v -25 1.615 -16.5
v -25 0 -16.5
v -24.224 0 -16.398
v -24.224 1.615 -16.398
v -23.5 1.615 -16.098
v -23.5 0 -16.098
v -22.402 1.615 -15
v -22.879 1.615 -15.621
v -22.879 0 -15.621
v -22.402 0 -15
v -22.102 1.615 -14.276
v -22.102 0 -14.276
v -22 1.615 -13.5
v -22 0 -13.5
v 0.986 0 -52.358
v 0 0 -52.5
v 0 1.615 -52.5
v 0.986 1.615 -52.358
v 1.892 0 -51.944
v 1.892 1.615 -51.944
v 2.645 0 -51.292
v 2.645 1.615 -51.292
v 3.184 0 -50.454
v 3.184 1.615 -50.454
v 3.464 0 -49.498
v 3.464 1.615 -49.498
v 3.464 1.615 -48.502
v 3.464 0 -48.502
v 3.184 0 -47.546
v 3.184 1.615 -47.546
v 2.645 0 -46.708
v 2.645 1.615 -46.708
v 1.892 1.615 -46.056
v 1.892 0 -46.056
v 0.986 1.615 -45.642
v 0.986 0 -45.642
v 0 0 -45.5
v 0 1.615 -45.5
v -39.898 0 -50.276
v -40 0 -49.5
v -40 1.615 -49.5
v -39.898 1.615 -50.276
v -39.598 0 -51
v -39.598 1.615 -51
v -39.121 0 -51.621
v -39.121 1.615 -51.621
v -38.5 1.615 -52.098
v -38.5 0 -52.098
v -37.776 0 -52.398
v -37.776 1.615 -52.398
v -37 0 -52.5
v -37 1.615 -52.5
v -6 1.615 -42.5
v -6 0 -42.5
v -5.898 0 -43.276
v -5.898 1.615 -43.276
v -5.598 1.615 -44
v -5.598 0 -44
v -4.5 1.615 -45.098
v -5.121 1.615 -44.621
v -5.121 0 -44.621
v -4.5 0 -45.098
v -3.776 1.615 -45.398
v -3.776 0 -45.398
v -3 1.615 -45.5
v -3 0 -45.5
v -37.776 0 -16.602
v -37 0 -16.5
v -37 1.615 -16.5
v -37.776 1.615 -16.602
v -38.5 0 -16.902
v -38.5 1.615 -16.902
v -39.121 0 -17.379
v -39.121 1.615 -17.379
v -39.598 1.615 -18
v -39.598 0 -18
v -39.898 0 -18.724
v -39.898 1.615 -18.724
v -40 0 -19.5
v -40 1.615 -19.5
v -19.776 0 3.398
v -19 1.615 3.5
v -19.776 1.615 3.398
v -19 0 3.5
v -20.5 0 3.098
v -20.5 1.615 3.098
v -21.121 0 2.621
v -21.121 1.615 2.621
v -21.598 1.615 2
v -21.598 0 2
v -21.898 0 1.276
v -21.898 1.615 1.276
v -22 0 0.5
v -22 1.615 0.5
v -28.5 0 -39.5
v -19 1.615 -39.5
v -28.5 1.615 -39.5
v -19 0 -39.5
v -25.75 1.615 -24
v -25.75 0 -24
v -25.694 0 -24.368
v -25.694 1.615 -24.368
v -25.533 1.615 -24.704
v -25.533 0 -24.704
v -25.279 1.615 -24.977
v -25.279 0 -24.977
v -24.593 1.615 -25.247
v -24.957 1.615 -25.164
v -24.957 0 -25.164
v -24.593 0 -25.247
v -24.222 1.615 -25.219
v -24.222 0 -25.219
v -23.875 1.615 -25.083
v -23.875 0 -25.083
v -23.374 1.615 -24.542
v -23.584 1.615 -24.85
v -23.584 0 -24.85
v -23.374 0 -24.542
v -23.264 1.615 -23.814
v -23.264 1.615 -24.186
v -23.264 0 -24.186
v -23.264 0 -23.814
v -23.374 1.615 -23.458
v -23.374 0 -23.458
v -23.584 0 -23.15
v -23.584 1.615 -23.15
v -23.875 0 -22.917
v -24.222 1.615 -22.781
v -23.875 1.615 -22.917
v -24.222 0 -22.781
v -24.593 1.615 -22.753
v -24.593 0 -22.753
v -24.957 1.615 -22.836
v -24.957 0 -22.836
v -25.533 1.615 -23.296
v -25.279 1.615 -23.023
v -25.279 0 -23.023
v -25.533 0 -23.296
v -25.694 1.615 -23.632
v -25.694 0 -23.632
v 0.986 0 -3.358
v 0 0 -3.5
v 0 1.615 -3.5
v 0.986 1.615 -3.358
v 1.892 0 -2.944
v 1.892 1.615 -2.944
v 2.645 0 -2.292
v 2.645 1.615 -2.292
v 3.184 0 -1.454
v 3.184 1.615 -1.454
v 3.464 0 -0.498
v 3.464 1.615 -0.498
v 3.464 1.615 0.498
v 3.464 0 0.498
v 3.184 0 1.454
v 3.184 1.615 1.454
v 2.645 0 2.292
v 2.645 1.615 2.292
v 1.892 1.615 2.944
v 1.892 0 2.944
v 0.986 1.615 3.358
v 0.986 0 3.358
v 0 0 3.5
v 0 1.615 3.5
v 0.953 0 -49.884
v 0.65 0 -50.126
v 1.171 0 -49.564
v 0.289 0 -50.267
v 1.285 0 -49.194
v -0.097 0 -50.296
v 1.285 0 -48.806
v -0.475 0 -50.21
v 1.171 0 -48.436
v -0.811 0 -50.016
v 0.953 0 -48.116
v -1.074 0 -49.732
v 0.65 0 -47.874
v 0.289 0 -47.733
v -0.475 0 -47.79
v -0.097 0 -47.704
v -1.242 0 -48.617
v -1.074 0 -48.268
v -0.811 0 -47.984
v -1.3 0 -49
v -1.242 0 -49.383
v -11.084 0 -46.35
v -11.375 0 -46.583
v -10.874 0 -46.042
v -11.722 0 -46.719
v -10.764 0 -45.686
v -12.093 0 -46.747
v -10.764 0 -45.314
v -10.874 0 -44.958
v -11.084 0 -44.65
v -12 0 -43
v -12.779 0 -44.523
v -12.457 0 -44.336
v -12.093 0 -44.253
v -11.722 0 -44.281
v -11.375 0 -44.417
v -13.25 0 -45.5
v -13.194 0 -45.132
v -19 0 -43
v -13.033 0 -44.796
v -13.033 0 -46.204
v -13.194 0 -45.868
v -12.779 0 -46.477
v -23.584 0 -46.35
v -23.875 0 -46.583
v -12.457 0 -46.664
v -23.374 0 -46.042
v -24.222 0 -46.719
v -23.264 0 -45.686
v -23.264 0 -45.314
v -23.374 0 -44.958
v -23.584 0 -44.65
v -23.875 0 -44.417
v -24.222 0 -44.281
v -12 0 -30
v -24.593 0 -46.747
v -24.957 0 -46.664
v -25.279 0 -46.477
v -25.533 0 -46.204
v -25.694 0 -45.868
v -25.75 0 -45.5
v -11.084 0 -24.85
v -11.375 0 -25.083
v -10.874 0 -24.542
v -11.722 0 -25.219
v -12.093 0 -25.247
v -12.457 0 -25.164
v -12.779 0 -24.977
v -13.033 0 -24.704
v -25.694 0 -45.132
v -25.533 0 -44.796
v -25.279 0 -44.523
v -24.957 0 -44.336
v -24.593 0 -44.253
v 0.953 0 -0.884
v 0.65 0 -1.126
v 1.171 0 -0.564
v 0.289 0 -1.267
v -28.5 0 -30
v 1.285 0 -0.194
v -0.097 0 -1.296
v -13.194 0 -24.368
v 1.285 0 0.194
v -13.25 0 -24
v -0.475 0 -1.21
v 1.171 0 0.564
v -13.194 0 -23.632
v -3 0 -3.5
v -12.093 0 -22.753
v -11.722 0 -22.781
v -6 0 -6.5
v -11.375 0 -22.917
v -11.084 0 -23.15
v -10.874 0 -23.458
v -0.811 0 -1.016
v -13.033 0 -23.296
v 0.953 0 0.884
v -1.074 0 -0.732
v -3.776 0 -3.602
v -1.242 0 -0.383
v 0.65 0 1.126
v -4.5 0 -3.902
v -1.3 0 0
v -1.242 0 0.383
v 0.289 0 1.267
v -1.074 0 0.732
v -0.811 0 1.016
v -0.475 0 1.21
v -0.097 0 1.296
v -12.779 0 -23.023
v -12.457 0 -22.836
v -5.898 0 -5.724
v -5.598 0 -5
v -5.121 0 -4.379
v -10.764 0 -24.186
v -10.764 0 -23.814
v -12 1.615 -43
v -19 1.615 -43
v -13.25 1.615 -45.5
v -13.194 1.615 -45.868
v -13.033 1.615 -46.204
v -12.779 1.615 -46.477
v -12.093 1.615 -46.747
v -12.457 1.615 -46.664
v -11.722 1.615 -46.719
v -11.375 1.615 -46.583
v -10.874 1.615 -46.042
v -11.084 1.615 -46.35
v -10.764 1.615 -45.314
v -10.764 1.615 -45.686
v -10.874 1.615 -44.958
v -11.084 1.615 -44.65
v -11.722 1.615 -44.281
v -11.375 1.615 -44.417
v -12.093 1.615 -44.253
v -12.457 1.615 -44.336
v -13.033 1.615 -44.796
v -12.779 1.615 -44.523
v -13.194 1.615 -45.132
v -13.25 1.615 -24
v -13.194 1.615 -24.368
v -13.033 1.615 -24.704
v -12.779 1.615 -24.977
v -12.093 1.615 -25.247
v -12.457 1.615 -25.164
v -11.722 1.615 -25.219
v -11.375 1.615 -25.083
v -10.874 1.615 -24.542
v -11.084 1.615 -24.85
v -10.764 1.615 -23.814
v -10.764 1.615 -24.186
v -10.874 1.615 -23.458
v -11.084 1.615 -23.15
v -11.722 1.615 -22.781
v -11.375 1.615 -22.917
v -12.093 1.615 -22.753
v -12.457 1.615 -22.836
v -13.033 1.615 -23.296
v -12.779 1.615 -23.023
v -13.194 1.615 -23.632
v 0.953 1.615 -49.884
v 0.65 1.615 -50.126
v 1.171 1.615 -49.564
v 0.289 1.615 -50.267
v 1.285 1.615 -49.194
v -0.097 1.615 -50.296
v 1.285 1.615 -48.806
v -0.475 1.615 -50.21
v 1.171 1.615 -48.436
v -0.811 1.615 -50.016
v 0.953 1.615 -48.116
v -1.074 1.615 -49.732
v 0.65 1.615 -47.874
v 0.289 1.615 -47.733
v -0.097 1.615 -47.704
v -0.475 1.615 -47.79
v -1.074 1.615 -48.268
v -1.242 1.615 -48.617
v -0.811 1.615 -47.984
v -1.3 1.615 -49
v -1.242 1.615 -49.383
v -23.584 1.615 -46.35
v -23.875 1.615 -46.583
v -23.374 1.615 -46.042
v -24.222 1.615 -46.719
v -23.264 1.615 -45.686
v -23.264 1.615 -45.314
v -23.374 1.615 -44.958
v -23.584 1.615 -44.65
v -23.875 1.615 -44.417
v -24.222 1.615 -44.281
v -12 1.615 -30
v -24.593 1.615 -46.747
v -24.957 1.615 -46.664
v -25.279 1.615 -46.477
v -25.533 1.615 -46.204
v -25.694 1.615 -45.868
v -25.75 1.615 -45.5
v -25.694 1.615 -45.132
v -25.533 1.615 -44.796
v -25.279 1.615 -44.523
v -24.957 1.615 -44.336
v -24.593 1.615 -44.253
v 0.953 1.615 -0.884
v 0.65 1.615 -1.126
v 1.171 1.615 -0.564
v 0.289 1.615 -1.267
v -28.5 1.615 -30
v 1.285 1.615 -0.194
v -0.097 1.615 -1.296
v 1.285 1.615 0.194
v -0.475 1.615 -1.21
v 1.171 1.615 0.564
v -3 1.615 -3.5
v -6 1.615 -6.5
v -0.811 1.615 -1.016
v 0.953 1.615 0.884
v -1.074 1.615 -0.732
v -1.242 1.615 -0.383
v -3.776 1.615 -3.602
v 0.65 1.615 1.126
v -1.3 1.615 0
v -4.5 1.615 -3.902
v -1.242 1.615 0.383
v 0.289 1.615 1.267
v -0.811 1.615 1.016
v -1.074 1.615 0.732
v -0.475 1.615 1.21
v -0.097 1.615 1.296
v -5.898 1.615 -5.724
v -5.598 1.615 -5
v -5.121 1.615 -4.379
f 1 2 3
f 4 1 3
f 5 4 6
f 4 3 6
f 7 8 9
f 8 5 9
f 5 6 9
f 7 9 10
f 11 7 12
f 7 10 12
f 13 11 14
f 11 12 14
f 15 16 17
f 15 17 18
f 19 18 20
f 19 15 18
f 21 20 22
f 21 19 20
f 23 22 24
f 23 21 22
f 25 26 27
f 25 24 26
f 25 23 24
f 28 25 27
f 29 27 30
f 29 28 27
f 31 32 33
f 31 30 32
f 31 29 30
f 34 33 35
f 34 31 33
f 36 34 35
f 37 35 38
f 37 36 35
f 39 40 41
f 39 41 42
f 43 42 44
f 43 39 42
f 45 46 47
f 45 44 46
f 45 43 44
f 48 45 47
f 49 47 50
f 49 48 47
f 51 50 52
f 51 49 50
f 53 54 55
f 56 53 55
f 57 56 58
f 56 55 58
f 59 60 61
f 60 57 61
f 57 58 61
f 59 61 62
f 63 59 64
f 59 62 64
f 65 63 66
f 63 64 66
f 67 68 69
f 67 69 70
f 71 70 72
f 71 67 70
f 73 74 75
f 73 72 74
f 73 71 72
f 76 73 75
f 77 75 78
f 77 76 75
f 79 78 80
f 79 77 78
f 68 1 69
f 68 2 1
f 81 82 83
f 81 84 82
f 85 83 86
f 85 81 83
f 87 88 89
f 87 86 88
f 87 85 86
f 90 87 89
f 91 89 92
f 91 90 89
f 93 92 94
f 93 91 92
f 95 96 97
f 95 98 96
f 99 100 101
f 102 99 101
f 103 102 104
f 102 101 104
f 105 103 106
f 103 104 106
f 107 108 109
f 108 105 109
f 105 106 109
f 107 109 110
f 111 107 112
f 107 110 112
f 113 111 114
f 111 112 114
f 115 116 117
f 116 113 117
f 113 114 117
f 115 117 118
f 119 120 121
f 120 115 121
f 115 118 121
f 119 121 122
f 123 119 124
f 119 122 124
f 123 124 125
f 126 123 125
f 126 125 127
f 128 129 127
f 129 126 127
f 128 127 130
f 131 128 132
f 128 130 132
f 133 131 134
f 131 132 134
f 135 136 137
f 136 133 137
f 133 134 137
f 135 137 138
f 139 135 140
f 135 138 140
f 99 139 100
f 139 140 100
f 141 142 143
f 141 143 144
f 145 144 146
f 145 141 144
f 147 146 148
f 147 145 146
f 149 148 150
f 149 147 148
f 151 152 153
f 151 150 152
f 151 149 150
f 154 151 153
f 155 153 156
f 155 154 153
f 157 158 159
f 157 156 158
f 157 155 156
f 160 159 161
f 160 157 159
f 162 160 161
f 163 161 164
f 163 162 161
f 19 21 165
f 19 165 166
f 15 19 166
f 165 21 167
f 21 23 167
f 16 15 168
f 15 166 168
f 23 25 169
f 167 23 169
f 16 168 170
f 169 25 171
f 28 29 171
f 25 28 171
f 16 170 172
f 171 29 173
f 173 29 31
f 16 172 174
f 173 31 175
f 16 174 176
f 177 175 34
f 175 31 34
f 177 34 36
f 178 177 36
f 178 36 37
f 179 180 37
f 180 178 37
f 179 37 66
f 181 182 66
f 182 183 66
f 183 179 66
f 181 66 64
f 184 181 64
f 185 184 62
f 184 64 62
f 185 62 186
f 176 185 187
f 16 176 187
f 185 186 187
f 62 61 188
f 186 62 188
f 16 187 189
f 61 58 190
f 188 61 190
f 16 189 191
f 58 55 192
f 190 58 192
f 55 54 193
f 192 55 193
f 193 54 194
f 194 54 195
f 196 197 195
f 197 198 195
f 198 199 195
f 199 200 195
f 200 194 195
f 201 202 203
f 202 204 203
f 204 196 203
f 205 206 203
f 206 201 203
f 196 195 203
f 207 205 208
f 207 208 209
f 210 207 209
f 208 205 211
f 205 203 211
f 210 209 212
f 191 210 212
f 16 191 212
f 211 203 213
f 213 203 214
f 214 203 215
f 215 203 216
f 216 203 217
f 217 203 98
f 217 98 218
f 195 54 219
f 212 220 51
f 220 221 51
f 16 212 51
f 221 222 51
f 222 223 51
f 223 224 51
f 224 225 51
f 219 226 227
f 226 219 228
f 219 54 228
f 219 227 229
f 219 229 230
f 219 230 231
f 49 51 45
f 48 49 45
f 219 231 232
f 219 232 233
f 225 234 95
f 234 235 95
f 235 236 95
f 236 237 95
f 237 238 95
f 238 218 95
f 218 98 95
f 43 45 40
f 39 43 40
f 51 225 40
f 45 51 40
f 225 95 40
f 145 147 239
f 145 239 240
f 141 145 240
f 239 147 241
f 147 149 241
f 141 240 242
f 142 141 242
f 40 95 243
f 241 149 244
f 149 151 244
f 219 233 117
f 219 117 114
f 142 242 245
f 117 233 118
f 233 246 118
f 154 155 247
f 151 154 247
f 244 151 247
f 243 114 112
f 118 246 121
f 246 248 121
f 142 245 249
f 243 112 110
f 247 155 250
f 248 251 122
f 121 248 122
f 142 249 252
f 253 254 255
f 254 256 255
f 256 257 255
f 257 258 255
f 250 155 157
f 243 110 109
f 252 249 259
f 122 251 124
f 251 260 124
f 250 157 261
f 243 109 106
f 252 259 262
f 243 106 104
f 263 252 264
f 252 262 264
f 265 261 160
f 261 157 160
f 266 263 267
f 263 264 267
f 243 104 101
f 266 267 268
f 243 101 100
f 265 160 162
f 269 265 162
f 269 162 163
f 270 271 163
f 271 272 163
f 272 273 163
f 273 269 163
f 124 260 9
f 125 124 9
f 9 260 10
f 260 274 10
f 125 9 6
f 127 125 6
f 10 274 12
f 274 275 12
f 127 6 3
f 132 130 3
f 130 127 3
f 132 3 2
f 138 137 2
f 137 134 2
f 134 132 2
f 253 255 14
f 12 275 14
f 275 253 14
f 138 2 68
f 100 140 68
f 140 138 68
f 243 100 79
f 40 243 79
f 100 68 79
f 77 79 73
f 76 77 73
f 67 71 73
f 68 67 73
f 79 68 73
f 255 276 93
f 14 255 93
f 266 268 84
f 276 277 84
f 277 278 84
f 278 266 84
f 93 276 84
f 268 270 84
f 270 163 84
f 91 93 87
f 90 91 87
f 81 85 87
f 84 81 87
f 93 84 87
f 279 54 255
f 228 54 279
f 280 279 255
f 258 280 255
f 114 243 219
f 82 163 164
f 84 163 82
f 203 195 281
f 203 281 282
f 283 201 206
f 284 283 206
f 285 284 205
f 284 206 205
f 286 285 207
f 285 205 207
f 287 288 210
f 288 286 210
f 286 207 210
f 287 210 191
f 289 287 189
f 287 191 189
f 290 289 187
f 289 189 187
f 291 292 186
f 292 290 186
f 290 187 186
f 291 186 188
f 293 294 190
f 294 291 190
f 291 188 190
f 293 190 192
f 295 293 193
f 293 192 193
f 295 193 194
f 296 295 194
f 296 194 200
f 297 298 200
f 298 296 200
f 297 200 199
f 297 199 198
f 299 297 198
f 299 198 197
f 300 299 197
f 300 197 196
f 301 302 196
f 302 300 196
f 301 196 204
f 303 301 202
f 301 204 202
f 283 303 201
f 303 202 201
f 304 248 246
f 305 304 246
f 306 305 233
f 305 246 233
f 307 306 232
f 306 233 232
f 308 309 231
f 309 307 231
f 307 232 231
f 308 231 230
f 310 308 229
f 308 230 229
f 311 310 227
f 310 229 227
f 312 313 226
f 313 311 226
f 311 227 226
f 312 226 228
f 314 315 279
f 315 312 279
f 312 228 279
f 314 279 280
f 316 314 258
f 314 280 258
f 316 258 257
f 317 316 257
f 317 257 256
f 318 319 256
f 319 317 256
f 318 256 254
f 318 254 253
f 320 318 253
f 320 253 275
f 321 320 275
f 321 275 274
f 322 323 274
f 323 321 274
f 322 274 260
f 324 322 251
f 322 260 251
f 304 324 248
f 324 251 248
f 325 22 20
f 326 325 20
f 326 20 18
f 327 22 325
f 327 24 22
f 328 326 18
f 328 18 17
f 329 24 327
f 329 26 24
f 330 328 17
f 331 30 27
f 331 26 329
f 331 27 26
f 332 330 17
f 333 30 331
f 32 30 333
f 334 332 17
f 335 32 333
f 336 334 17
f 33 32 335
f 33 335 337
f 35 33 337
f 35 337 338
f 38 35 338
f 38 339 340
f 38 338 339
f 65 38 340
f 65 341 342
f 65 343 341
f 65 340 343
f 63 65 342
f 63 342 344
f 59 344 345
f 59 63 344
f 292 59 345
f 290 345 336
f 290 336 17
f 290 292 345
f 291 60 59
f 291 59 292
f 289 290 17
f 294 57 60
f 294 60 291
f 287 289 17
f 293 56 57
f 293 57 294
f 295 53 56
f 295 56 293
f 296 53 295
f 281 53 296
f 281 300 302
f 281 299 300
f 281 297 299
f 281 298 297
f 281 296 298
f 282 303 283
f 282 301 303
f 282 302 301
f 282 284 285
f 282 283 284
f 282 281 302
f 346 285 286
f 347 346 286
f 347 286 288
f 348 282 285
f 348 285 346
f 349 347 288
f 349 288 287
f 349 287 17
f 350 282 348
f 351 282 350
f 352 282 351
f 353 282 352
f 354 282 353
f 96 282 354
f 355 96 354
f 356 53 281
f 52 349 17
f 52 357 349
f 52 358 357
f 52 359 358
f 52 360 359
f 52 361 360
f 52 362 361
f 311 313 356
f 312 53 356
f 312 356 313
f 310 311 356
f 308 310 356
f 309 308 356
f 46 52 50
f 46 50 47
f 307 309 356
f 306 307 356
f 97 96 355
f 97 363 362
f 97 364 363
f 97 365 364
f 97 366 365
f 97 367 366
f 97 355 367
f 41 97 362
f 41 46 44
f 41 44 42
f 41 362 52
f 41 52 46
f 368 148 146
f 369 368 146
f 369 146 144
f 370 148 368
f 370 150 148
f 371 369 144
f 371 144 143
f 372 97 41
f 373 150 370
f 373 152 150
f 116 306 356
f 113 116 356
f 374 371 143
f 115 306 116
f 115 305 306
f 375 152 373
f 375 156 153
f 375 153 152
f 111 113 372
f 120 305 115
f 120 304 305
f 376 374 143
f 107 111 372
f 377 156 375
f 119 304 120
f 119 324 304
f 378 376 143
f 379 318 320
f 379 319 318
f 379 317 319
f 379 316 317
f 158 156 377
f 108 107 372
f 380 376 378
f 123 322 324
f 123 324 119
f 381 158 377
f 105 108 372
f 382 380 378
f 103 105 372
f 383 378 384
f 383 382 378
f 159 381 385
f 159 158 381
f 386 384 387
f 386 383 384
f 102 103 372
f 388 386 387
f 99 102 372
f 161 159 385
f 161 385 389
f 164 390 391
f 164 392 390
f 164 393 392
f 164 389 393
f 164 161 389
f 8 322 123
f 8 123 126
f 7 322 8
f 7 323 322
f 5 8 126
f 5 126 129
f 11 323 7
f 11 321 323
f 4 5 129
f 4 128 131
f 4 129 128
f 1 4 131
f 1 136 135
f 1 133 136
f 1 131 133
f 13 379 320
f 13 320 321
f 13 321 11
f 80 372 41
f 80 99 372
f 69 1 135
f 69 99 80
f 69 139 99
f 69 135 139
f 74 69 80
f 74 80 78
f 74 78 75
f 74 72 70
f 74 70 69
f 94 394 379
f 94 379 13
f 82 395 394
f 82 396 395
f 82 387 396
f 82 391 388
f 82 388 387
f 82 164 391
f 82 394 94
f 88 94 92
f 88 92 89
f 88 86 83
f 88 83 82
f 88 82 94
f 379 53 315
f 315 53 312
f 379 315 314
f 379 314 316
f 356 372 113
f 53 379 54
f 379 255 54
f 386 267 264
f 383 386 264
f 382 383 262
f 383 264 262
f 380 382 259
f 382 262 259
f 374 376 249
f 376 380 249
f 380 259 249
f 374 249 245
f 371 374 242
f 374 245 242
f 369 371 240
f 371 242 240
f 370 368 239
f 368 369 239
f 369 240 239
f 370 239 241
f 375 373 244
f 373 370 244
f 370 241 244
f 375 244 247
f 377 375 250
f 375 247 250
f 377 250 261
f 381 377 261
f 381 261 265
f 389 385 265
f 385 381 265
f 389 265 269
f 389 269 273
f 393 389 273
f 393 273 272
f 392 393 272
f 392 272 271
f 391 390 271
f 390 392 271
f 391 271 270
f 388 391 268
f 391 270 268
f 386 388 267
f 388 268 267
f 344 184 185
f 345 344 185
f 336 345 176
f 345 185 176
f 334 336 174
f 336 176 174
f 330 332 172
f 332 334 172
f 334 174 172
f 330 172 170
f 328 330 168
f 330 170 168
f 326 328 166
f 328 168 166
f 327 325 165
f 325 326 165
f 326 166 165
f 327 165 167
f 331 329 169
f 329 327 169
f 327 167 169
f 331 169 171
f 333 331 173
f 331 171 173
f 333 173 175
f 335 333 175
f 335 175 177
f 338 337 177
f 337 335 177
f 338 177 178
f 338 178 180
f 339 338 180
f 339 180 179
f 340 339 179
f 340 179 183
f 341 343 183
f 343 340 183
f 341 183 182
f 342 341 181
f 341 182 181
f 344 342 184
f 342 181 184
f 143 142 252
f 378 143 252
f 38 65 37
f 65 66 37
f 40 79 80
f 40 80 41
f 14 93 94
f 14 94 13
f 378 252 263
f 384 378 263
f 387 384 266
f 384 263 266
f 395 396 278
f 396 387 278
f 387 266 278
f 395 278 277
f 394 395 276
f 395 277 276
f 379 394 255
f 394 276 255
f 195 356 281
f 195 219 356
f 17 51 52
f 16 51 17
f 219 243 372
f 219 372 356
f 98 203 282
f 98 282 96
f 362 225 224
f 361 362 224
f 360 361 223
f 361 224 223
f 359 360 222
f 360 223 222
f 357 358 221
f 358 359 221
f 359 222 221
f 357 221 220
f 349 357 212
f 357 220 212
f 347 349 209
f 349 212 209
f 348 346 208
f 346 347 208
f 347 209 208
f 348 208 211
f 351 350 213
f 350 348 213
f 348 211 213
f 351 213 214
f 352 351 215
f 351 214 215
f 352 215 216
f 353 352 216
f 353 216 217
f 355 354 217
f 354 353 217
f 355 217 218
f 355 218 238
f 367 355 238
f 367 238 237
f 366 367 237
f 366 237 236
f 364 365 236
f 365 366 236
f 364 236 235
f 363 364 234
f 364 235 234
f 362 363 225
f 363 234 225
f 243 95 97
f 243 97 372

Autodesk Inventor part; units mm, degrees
ref_plane "YZ Plane" through (0, 0, 0) normal (1, 0, 0) x (0, 1, 0)
ref_plane "XZ Plane" through (0, 0, 0) normal (0, 1, 0) x (-1, 0, 0)
ref_plane "XY Plane" through (0, 0, 0) normal (0, 0, 1) x (1, 0, 0)
sketch "Sketch1" plane through (0, 0, 0) normal (0, 1, 0) x (-1, 0, 0)
  circle A0 centre (0, 0) radius 1.3
  circle A1 centre (0, -49) radius 1.3
  arc A2 (0, 3.5) -> (0, -3.5) centre (0, 0) ccw
  arc A3 (0, -45.5) -> (0, -52.5) centre (0, -49) ccw
  line L0 (0, 3.5) -> (19, 3.5)
  line L1 (22, 0.5) -> (22, -13.5)
  line L2 (25, -16.5) -> (37, -16.5)
  line L3 (40, -19.5) -> (40, -49.5)
  line L4 (37, -52.5) -> (0, -52.5)
  line L5 (0, -3.5) -> (3, -3.5)
  line L6 (6, -6.5) -> (6, -42.5)
  line L7 (3, -45.5) -> (0, -45.5)
  arc A4 (6, -6.5) -> (3, -3.5) centre (3, -6.5) ccw
  arc A5 (22, 0.5) -> (19, 3.5) centre (19, 0.5) ccw
  arc A6 (22, -13.5) -> (25, -16.5) centre (25, -13.5) ccw
  arc A7 (40, -19.5) -> (37, -16.5) centre (37, -19.5) ccw
  arc A8 (37, -52.5) -> (40, -49.5) centre (37, -49.5) ccw
  arc A9 (3, -45.5) -> (6, -42.5) centre (3, -42.5) ccw
  circle A10 centre (12, -24) radius 1.25
  circle A11 centre (12, -45.5) radius 1.25
  circle A12 centre (24.5, -45.5) radius 1.25
  circle A13 centre (24.5, -24) radius 1.25
  line L8 (28.5, -30) -> (12, -30)
  line L9 (12, -30) -> (12, -43)
  line L10 (12, -43) -> (19, -43)
  line L11 (19, -43) -> (19, -39.5)
  line L12 (19, -39.5) -> (28.5, -39.5)
  line L13 (28.5, -39.5) -> (28.5, -30)
  line L14 (28.5, -34.75) -> (12, -34.75) construction
  point P0 (22, 3.5)
  point P1 (22, -16.5)
  point P2 (40, -52.5)
  dimension "d0" = 49
  dimension "d1" = 2.6
  dimension "d2" = 7
  dimension "d3" = 22
  dimension "d4" = 20
  dimension "d5" = 40
  dimension "d6" = 6
  dimension "d7" = 3
  dimension "d14" = 2.5
  dimension "d15" = 12.5
  dimension "d16" = 12
  dimension "d17" = 9.5
  dimension "d18" = 3.5
  dimension "d19" = 7
  dimension "d20" = 21.5
  dimension "d21" = 7
extrude "Extrusion1" add sketch "Sketch1" along normal blind 1.615
properties part number "freestanding_cam_mount"
